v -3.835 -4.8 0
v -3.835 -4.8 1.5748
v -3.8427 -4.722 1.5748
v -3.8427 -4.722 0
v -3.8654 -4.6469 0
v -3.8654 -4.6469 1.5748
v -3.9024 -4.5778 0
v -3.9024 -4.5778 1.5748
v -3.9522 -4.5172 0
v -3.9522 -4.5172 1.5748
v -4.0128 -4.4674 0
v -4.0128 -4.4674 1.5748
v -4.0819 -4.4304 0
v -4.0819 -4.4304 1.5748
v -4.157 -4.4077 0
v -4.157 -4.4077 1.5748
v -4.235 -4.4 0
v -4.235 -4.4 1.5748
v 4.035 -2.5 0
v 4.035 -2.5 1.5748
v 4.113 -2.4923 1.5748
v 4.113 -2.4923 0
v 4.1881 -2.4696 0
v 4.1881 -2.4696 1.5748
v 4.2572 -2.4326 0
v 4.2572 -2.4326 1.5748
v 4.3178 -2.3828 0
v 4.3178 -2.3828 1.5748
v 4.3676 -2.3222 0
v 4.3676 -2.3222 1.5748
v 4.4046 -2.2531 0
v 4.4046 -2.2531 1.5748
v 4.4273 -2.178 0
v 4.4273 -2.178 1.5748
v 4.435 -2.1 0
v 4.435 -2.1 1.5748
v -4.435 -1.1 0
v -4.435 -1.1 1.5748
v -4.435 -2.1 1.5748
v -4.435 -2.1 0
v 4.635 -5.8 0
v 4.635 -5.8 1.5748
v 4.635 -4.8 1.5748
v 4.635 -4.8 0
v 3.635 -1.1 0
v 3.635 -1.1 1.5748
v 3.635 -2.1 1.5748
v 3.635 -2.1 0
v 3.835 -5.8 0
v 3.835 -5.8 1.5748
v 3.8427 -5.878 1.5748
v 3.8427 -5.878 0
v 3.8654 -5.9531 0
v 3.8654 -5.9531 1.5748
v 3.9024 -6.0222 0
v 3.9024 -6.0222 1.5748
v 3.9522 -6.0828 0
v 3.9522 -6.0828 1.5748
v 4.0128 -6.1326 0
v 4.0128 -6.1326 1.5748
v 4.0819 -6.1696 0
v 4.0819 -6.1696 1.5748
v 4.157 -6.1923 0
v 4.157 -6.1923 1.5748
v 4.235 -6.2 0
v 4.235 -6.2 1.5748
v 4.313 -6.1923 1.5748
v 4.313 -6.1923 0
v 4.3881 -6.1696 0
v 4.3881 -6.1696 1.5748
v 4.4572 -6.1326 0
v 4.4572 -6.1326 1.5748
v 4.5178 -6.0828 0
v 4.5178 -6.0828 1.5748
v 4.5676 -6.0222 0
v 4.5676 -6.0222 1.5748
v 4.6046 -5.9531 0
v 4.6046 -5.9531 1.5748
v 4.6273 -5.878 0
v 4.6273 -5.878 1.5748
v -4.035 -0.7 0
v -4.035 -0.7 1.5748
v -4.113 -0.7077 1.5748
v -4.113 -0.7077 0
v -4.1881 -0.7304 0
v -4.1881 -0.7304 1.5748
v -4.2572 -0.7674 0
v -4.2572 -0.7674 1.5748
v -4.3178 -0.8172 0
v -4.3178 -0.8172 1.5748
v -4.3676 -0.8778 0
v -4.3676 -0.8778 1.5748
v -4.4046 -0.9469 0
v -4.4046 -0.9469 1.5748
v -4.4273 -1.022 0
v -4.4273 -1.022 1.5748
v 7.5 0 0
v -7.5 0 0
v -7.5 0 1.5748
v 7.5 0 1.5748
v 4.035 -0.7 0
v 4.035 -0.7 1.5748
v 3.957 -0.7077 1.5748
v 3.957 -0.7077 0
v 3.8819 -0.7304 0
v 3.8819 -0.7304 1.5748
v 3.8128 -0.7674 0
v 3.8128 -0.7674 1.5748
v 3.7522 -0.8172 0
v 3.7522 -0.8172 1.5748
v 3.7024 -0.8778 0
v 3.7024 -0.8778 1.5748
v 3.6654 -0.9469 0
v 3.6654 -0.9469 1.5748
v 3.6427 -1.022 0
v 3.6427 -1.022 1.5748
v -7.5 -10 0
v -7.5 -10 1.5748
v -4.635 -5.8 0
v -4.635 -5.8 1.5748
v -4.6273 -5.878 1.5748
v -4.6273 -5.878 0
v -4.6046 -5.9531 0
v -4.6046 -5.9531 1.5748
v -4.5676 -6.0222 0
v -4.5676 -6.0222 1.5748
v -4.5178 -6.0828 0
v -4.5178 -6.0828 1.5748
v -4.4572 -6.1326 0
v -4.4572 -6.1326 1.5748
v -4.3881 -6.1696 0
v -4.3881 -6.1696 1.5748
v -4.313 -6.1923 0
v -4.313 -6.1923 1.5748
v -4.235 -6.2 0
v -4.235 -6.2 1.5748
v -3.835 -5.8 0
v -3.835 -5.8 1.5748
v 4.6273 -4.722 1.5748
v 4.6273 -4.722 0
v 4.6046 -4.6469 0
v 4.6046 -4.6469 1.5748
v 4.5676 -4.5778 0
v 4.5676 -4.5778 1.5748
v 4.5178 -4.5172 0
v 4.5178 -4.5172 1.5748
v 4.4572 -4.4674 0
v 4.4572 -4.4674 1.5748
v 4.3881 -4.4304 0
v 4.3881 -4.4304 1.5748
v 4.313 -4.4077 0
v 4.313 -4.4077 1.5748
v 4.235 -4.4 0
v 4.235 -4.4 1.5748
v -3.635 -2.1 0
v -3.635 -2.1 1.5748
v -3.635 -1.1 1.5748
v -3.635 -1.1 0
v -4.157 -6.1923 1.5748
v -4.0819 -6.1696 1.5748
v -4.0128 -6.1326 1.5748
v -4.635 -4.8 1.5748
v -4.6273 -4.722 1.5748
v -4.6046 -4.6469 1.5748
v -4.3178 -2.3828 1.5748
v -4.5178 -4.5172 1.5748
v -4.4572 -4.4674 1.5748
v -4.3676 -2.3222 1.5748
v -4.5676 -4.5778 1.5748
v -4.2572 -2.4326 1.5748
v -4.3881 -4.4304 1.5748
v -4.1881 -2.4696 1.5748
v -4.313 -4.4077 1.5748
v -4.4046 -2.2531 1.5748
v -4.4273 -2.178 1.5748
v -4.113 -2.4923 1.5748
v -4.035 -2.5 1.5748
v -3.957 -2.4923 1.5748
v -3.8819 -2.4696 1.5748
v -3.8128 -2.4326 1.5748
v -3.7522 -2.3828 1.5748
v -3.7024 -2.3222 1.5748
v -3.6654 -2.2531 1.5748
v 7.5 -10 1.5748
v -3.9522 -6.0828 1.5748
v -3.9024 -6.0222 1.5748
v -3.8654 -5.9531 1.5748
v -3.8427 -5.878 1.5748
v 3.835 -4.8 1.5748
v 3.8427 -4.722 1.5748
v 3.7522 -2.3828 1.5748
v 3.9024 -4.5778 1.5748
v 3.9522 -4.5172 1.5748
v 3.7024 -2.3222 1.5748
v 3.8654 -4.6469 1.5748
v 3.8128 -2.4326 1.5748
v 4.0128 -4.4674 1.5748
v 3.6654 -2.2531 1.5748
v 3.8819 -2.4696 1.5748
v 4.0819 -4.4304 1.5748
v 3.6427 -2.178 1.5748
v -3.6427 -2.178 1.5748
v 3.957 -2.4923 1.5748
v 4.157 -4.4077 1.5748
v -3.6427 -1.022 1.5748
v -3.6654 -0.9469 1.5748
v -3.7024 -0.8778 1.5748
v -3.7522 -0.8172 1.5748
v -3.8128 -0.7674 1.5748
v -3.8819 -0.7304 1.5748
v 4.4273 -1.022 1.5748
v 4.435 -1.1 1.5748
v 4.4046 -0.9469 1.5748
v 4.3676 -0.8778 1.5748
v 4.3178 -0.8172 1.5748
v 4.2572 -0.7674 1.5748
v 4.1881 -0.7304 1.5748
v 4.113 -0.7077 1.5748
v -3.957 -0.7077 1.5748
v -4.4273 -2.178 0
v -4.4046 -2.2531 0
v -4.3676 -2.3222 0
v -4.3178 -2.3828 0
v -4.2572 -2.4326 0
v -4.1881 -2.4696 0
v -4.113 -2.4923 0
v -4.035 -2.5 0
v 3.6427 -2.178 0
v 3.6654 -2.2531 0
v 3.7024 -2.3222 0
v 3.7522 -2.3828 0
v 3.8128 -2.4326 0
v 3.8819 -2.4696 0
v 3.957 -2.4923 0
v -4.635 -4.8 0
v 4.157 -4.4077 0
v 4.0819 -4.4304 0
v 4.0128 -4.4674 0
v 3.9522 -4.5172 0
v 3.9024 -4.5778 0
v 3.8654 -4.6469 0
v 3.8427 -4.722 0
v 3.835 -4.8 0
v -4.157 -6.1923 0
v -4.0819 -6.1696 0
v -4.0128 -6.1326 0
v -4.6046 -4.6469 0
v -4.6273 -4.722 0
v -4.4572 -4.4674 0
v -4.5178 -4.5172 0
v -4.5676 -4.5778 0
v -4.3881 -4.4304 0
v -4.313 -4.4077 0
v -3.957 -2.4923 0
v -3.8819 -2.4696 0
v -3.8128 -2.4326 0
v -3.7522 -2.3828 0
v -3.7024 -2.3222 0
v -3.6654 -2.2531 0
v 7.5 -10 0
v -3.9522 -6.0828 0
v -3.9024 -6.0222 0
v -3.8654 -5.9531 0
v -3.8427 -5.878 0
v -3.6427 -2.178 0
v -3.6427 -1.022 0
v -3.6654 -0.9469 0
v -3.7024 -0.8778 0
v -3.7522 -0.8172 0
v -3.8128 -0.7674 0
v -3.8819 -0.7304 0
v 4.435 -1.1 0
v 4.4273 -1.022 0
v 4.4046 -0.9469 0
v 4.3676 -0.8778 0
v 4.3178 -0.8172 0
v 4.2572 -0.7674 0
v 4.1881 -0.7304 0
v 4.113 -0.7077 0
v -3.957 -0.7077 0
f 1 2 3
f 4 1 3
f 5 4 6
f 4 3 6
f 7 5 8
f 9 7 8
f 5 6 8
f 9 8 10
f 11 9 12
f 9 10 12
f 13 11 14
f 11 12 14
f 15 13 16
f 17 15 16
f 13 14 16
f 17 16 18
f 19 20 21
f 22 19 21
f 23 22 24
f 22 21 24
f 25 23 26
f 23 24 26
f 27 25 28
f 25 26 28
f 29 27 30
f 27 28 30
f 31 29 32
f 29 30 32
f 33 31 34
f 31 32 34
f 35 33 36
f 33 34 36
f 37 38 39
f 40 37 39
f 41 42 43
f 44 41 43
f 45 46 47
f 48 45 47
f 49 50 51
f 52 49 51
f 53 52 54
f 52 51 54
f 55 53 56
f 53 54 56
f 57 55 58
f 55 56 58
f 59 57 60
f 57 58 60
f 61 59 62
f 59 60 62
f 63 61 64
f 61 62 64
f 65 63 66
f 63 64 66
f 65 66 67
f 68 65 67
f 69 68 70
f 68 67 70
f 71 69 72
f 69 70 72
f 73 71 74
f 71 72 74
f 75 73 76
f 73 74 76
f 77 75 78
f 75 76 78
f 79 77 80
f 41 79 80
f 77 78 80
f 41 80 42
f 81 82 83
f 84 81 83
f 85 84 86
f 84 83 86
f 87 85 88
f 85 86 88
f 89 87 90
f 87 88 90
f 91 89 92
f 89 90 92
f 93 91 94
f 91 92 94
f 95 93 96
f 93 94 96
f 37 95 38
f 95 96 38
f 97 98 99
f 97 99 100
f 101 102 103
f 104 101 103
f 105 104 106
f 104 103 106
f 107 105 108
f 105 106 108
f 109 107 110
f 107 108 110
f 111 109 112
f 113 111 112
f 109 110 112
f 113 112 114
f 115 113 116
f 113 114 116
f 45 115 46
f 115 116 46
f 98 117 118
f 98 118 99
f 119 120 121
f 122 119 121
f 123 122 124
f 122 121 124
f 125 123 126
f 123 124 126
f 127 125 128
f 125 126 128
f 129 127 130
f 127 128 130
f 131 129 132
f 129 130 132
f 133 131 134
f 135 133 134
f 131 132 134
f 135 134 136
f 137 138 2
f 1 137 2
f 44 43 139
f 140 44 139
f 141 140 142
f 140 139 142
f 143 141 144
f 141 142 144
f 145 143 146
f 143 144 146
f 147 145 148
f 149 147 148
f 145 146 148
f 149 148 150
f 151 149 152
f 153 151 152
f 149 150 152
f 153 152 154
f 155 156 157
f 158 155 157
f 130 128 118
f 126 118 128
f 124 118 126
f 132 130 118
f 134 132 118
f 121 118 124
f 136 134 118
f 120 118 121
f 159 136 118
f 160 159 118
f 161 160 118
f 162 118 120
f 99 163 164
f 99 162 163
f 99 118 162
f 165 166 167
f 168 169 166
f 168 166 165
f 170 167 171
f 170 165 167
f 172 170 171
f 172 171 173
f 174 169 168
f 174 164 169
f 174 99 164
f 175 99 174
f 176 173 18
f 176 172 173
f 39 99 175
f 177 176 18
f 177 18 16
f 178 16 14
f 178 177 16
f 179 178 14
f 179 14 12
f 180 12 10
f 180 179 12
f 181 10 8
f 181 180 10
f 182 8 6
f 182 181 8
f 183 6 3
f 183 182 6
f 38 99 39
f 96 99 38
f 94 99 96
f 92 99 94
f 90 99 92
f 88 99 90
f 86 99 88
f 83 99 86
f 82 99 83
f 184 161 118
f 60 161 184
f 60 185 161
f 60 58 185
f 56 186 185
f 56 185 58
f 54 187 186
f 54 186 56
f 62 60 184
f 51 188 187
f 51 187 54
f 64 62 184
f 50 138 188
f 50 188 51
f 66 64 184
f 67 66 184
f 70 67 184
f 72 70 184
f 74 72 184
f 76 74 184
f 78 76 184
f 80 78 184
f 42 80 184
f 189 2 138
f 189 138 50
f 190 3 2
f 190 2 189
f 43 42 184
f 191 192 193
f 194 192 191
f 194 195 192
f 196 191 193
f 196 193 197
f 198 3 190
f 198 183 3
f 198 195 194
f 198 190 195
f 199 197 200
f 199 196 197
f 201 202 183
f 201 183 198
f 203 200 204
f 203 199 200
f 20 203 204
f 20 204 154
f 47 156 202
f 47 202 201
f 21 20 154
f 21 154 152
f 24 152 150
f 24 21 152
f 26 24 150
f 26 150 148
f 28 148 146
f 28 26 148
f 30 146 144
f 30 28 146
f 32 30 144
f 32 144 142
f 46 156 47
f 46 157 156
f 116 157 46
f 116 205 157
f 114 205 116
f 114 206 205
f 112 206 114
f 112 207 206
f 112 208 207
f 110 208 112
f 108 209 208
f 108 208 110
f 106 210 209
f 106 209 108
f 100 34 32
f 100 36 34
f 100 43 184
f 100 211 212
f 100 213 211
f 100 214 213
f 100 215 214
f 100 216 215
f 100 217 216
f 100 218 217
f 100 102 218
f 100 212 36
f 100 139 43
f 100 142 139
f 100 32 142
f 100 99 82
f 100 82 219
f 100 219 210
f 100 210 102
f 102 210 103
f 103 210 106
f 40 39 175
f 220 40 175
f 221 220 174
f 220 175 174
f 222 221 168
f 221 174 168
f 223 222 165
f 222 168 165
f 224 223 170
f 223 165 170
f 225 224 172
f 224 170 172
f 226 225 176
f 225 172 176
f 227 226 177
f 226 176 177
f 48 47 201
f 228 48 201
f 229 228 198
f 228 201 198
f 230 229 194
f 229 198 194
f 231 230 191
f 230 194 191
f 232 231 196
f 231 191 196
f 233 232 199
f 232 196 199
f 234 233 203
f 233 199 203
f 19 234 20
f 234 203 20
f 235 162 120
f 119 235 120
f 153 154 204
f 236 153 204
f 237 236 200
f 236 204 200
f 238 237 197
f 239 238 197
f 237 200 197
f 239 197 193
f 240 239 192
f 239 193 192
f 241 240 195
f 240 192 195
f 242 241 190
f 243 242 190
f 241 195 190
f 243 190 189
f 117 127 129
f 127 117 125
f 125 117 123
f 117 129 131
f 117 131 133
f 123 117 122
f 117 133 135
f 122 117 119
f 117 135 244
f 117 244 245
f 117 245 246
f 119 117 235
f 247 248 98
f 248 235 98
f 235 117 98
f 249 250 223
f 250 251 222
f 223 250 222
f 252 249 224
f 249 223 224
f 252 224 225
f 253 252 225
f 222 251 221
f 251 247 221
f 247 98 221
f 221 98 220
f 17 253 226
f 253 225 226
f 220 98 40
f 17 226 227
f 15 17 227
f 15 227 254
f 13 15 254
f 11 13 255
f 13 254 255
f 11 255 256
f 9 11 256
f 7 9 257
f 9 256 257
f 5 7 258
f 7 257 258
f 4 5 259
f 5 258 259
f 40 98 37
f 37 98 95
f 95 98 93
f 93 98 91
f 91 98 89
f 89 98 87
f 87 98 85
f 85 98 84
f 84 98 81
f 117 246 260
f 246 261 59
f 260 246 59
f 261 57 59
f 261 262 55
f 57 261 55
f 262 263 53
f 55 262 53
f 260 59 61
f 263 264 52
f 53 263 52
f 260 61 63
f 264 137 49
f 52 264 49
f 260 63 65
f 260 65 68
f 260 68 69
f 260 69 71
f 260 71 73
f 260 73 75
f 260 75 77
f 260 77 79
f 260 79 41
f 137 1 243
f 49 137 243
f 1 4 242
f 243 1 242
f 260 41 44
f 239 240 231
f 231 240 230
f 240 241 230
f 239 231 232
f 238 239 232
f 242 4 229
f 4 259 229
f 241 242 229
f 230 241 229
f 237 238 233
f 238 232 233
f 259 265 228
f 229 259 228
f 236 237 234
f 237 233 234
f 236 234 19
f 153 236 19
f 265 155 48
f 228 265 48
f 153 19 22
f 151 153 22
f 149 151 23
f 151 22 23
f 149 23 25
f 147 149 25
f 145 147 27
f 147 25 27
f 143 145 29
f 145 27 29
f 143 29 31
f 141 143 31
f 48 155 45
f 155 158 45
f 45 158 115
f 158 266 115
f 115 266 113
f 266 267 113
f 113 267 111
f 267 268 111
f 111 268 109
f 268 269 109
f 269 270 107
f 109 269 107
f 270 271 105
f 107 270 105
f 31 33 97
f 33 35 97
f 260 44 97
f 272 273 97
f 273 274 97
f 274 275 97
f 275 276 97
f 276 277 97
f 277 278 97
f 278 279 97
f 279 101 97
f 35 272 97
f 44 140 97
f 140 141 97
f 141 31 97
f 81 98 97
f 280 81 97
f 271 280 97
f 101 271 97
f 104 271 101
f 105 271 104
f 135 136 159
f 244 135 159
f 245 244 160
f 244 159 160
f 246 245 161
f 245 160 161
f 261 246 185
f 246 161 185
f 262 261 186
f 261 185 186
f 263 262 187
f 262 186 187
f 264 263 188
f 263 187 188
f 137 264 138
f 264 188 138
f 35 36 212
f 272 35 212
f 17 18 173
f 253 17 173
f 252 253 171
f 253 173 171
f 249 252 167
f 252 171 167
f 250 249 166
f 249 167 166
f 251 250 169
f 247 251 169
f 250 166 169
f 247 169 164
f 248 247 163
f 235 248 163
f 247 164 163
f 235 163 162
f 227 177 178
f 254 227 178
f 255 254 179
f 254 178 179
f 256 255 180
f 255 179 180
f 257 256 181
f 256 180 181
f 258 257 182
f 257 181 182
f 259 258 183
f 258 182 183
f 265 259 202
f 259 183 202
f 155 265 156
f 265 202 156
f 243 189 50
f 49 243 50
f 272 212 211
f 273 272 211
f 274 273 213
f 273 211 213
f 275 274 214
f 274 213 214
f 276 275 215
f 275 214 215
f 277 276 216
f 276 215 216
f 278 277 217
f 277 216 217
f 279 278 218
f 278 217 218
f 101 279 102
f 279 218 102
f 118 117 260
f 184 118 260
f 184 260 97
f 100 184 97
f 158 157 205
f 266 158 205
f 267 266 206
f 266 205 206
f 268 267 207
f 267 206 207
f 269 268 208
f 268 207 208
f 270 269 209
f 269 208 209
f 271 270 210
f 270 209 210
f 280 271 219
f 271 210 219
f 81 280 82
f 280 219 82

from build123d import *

# Parameters (mm, degrees)
F0_W     = 15
F0_H     = 10
F1_DEPTH = 1.5748
F3_DEPTH = 25


with BuildPart() as f1:
    # F0 (on Top) → F1 (new body)
    with BuildSketch(Plane.XY):
        with Locations((0, -5)):
            Rectangle(F0_W, F0_H)
    extrude(amount=F1_DEPTH)

    # F2 (on face) → F3 (cut)
    with BuildSketch(Plane.XY.offset(1.5748)):
        with BuildLine():
            ThreePointArc((-4.435, -2.1), (-4.3178427125, -2.3828427125), (-4.035, -2.5))
            ThreePointArc((-4.035, -2.5), (-3.7521572875, -2.3828427125), (-3.635, -2.1))
            Line((-3.635, -2.1), (-3.635, -1.1))
            ThreePointArc((-3.635, -1.1), (-3.7521572875, -0.8171572875), (-4.035, -0.7))
            ThreePointArc((-4.035, -0.7), (-4.3178427125, -0.8171572875), (-4.435, -1.1))
            Line((-4.435, -1.1), (-4.435, -2.1))
        make_face()
        with BuildLine():
            ThreePointArc((-4.635, -5.8), (-4.5178427125, -6.0828427125), (-4.235, -6.2))
            ThreePointArc((-4.235, -6.2), (-3.9521572875, -6.0828427125), (-3.835, -5.8))
            Line((-3.835, -5.8), (-3.835, -4.8))
            ThreePointArc((-3.835, -4.8), (-3.9521572875, -4.5171572875), (-4.235, -4.4))
            ThreePointArc((-4.235, -4.4), (-4.5178427125, -4.5171572875), (-4.635, -4.8))
            Line((-4.635, -4.8), (-4.635, -5.8))
        make_face()
        with BuildLine():
            ThreePointArc((3.835, -5.8), (3.9521572875, -6.0828427125), (4.235, -6.2))
            ThreePointArc((4.235, -6.2), (4.5178427125, -6.0828427125), (4.635, -5.8))
            Line((4.635, -5.8), (4.635, -4.8))
            ThreePointArc((4.635, -4.8), (4.5178427125, -4.5171572875), (4.235, -4.4))
            ThreePointArc((4.235, -4.4), (3.9521572875, -4.5171572875), (3.835, -4.8))
            Line((3.835, -4.8), (3.835, -5.8))
        make_face()
        with BuildLine():
            ThreePointArc((4.035, -2.5), (4.3178427125, -2.3828427125), (4.435, -2.1))
            Line((4.435, -2.1), (4.435, -1.1))
            ThreePointArc((4.435, -1.1), (4.3178427125, -0.8171572875), (4.035, -0.7))
            ThreePointArc((4.035, -0.7), (3.7521572875, -0.8171572875), (3.635, -1.1))
            Line((3.635, -1.1), (3.635, -2.1))
            ThreePointArc((3.635, -2.1), (3.7521572875, -2.3828427125), (4.035, -2.5))
        make_face()
    extrude(amount=-F3_DEPTH, mode=Mode.SUBTRACT)


solid = f1.part
